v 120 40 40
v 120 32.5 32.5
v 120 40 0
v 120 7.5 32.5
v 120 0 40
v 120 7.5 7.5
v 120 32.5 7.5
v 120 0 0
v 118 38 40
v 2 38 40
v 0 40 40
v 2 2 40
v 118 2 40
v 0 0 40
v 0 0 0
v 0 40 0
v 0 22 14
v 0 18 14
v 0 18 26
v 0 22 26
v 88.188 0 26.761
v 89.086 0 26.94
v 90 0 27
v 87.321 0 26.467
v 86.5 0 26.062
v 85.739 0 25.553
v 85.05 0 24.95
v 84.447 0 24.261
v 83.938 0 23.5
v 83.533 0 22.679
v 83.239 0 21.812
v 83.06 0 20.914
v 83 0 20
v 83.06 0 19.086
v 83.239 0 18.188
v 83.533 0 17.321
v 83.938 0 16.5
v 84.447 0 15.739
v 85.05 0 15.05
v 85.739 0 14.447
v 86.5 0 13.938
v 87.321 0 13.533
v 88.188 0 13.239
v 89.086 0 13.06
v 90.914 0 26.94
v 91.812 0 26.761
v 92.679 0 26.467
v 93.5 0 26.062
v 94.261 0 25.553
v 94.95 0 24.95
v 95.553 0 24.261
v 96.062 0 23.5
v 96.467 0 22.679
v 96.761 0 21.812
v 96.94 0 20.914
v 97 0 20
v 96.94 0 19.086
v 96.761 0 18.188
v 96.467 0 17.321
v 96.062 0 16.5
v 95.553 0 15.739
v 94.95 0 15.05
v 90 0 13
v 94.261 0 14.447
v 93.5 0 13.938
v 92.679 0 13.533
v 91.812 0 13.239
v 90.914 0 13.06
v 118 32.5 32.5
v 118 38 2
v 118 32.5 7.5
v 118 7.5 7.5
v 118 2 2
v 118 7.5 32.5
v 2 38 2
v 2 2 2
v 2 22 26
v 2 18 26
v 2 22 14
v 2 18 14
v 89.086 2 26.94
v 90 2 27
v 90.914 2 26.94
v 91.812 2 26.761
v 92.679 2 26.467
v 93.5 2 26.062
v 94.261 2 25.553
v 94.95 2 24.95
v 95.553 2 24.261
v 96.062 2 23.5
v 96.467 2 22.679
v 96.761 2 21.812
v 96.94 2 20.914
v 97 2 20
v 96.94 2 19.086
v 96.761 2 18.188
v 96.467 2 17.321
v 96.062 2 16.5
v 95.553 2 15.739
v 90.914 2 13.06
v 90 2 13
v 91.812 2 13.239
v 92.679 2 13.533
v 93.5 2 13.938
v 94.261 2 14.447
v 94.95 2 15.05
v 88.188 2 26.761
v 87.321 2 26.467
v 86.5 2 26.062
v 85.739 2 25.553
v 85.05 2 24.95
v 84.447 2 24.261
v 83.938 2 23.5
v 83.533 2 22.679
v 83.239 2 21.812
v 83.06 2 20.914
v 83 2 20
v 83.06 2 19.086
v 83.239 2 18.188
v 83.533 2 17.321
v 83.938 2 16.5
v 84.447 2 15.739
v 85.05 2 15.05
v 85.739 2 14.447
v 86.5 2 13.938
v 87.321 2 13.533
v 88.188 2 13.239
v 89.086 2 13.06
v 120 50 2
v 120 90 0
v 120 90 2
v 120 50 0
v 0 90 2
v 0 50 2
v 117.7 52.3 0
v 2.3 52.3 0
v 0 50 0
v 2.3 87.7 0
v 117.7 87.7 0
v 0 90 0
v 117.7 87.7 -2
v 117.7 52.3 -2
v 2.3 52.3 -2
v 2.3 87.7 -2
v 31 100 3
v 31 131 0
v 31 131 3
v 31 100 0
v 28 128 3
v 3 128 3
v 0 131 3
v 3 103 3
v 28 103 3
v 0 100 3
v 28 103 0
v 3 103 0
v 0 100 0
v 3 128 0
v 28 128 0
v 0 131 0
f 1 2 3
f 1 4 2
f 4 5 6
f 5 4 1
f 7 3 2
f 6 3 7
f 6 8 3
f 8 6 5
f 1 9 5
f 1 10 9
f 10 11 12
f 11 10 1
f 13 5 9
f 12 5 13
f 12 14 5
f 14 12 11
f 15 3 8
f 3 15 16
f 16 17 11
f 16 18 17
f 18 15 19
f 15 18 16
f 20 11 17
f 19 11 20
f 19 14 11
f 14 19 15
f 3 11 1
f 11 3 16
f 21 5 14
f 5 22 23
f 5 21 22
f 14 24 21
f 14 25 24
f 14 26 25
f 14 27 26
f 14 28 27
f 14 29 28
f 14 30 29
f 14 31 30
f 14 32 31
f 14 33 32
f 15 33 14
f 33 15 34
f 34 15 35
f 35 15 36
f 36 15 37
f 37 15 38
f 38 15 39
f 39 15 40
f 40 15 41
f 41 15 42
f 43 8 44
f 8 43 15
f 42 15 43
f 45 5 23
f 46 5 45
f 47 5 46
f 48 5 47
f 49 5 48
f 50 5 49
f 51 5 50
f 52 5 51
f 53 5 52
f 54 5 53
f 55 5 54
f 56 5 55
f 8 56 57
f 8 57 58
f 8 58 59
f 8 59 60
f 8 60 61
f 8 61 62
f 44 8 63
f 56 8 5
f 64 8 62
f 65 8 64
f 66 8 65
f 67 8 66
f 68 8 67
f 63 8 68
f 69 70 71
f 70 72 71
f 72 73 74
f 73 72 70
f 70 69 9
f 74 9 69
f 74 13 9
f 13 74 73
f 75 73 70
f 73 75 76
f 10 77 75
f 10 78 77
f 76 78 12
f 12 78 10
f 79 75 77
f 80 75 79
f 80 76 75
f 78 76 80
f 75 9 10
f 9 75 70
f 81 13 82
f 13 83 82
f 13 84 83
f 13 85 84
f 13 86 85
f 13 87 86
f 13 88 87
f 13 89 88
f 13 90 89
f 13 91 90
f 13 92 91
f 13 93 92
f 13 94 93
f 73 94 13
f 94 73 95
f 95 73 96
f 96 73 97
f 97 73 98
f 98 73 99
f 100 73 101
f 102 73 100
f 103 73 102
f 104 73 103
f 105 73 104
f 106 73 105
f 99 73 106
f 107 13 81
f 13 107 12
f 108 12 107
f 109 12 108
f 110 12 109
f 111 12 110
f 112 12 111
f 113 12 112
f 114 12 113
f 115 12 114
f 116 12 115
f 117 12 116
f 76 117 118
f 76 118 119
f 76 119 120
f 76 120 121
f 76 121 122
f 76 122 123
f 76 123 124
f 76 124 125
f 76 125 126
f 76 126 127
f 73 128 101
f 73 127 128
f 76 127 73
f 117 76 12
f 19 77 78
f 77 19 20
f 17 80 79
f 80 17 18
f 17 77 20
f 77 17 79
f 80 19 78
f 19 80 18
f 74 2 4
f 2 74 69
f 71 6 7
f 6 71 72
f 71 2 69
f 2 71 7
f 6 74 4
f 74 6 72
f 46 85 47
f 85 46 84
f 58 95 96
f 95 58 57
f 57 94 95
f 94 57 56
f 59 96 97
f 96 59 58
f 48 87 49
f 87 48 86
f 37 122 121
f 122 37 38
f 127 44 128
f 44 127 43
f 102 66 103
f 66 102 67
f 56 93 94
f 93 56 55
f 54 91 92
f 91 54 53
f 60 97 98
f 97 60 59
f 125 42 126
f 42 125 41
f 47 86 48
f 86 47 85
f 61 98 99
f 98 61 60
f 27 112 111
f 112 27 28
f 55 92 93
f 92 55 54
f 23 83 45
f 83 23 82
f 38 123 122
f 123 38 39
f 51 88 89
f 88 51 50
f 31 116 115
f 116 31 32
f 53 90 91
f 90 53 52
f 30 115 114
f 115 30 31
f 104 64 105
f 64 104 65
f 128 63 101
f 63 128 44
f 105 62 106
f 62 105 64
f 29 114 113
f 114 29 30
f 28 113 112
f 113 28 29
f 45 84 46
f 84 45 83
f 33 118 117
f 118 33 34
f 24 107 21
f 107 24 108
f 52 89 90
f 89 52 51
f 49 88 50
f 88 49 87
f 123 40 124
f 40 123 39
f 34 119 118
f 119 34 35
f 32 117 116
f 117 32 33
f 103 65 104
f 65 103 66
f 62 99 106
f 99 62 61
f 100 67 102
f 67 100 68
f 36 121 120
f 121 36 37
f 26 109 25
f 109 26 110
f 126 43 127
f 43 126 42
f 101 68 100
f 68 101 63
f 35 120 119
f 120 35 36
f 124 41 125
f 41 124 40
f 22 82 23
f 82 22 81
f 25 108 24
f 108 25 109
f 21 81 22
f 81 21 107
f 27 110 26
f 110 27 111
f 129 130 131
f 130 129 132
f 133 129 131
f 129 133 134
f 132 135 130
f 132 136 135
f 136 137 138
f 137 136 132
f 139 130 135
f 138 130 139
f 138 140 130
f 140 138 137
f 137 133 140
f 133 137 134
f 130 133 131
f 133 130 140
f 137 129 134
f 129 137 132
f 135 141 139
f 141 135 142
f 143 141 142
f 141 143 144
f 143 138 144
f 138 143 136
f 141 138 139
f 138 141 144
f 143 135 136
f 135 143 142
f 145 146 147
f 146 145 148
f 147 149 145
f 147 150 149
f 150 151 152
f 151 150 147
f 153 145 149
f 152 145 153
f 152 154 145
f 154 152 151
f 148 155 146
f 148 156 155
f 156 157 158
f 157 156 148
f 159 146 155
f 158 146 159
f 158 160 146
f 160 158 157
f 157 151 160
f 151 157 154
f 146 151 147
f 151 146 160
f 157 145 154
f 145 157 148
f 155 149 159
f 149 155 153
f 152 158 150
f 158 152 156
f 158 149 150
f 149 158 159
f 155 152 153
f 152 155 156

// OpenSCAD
// OPENLAB — DIY spectrometer body (3D-printable)
// License: CC BY-SA 4.0. Units: mm. Print in PLA, 0.2 mm layers, 15 % infill, no supports.
// Geometry: a light-tight tube. Light enters through a 0.2 mm slit at one end,
// hits the grating at the far end at ~45°, and the first-order spectrum is
// imaged by a webcam/phone through the side port.

tube_len   = 120;   // slit-to-grating distance
tube_w     = 40;
tube_h     = 40;
wall       = 2;
slit_w     = 0.2;   // razor-blade slit is glued over this; this is just a window
slit_h     = 12;
grating_sz = 25;    // 25 x 25 mm grating window
cam_port_d = 14;    // webcam/phone lens port diameter
cam_angle  = 45;    // first-order angle for 1000 l/mm at ~550 nm is ~33°; 45° port gives room

module body() {
  difference() {
    cube([tube_len, tube_w, tube_h]);
    // hollow
    translate([wall, wall, wall]) cube([tube_len - 2*wall, tube_w - 2*wall, tube_h + 1]);
    // slit window at x = 0
    translate([-1, tube_w/2 - 2, tube_h/2 - slit_h/2]) cube([wall + 2, 4, slit_h]);
    // grating window at far end
    translate([tube_len - wall - 1, tube_w/2 - grating_sz/2, tube_h/2 - grating_sz/2])
      cube([wall + 2, grating_sz, grating_sz]);
    // camera port on the side wall, angled toward the grating
    translate([tube_len - 30, -1, tube_h/2]) rotate([-90, 0, 0]) cylinder(d = cam_port_d, h = wall + 2, $fn = 48);
  }
}

module lid() {
  difference() {
    cube([tube_len, tube_w, wall]);
    // lip so the lid sits in the tube
  }
  translate([wall + 0.3, wall + 0.3, -wall]) cube([tube_len - 2*wall - 0.6, tube_w - 2*wall - 0.6, wall]);
}

module grating_holder() {
  // slides over the far end; holds a 25 mm grating tilted at 45°
  difference() {
    cube([grating_sz + 6, grating_sz + 6, 3]);
    translate([3, 3, -1]) cube([grating_sz, grating_sz, 5]);
  }
}

body();
translate([0, tube_w + 10, 0]) lid();
translate([0, 2*tube_w + 20, 0]) grating_holder();
